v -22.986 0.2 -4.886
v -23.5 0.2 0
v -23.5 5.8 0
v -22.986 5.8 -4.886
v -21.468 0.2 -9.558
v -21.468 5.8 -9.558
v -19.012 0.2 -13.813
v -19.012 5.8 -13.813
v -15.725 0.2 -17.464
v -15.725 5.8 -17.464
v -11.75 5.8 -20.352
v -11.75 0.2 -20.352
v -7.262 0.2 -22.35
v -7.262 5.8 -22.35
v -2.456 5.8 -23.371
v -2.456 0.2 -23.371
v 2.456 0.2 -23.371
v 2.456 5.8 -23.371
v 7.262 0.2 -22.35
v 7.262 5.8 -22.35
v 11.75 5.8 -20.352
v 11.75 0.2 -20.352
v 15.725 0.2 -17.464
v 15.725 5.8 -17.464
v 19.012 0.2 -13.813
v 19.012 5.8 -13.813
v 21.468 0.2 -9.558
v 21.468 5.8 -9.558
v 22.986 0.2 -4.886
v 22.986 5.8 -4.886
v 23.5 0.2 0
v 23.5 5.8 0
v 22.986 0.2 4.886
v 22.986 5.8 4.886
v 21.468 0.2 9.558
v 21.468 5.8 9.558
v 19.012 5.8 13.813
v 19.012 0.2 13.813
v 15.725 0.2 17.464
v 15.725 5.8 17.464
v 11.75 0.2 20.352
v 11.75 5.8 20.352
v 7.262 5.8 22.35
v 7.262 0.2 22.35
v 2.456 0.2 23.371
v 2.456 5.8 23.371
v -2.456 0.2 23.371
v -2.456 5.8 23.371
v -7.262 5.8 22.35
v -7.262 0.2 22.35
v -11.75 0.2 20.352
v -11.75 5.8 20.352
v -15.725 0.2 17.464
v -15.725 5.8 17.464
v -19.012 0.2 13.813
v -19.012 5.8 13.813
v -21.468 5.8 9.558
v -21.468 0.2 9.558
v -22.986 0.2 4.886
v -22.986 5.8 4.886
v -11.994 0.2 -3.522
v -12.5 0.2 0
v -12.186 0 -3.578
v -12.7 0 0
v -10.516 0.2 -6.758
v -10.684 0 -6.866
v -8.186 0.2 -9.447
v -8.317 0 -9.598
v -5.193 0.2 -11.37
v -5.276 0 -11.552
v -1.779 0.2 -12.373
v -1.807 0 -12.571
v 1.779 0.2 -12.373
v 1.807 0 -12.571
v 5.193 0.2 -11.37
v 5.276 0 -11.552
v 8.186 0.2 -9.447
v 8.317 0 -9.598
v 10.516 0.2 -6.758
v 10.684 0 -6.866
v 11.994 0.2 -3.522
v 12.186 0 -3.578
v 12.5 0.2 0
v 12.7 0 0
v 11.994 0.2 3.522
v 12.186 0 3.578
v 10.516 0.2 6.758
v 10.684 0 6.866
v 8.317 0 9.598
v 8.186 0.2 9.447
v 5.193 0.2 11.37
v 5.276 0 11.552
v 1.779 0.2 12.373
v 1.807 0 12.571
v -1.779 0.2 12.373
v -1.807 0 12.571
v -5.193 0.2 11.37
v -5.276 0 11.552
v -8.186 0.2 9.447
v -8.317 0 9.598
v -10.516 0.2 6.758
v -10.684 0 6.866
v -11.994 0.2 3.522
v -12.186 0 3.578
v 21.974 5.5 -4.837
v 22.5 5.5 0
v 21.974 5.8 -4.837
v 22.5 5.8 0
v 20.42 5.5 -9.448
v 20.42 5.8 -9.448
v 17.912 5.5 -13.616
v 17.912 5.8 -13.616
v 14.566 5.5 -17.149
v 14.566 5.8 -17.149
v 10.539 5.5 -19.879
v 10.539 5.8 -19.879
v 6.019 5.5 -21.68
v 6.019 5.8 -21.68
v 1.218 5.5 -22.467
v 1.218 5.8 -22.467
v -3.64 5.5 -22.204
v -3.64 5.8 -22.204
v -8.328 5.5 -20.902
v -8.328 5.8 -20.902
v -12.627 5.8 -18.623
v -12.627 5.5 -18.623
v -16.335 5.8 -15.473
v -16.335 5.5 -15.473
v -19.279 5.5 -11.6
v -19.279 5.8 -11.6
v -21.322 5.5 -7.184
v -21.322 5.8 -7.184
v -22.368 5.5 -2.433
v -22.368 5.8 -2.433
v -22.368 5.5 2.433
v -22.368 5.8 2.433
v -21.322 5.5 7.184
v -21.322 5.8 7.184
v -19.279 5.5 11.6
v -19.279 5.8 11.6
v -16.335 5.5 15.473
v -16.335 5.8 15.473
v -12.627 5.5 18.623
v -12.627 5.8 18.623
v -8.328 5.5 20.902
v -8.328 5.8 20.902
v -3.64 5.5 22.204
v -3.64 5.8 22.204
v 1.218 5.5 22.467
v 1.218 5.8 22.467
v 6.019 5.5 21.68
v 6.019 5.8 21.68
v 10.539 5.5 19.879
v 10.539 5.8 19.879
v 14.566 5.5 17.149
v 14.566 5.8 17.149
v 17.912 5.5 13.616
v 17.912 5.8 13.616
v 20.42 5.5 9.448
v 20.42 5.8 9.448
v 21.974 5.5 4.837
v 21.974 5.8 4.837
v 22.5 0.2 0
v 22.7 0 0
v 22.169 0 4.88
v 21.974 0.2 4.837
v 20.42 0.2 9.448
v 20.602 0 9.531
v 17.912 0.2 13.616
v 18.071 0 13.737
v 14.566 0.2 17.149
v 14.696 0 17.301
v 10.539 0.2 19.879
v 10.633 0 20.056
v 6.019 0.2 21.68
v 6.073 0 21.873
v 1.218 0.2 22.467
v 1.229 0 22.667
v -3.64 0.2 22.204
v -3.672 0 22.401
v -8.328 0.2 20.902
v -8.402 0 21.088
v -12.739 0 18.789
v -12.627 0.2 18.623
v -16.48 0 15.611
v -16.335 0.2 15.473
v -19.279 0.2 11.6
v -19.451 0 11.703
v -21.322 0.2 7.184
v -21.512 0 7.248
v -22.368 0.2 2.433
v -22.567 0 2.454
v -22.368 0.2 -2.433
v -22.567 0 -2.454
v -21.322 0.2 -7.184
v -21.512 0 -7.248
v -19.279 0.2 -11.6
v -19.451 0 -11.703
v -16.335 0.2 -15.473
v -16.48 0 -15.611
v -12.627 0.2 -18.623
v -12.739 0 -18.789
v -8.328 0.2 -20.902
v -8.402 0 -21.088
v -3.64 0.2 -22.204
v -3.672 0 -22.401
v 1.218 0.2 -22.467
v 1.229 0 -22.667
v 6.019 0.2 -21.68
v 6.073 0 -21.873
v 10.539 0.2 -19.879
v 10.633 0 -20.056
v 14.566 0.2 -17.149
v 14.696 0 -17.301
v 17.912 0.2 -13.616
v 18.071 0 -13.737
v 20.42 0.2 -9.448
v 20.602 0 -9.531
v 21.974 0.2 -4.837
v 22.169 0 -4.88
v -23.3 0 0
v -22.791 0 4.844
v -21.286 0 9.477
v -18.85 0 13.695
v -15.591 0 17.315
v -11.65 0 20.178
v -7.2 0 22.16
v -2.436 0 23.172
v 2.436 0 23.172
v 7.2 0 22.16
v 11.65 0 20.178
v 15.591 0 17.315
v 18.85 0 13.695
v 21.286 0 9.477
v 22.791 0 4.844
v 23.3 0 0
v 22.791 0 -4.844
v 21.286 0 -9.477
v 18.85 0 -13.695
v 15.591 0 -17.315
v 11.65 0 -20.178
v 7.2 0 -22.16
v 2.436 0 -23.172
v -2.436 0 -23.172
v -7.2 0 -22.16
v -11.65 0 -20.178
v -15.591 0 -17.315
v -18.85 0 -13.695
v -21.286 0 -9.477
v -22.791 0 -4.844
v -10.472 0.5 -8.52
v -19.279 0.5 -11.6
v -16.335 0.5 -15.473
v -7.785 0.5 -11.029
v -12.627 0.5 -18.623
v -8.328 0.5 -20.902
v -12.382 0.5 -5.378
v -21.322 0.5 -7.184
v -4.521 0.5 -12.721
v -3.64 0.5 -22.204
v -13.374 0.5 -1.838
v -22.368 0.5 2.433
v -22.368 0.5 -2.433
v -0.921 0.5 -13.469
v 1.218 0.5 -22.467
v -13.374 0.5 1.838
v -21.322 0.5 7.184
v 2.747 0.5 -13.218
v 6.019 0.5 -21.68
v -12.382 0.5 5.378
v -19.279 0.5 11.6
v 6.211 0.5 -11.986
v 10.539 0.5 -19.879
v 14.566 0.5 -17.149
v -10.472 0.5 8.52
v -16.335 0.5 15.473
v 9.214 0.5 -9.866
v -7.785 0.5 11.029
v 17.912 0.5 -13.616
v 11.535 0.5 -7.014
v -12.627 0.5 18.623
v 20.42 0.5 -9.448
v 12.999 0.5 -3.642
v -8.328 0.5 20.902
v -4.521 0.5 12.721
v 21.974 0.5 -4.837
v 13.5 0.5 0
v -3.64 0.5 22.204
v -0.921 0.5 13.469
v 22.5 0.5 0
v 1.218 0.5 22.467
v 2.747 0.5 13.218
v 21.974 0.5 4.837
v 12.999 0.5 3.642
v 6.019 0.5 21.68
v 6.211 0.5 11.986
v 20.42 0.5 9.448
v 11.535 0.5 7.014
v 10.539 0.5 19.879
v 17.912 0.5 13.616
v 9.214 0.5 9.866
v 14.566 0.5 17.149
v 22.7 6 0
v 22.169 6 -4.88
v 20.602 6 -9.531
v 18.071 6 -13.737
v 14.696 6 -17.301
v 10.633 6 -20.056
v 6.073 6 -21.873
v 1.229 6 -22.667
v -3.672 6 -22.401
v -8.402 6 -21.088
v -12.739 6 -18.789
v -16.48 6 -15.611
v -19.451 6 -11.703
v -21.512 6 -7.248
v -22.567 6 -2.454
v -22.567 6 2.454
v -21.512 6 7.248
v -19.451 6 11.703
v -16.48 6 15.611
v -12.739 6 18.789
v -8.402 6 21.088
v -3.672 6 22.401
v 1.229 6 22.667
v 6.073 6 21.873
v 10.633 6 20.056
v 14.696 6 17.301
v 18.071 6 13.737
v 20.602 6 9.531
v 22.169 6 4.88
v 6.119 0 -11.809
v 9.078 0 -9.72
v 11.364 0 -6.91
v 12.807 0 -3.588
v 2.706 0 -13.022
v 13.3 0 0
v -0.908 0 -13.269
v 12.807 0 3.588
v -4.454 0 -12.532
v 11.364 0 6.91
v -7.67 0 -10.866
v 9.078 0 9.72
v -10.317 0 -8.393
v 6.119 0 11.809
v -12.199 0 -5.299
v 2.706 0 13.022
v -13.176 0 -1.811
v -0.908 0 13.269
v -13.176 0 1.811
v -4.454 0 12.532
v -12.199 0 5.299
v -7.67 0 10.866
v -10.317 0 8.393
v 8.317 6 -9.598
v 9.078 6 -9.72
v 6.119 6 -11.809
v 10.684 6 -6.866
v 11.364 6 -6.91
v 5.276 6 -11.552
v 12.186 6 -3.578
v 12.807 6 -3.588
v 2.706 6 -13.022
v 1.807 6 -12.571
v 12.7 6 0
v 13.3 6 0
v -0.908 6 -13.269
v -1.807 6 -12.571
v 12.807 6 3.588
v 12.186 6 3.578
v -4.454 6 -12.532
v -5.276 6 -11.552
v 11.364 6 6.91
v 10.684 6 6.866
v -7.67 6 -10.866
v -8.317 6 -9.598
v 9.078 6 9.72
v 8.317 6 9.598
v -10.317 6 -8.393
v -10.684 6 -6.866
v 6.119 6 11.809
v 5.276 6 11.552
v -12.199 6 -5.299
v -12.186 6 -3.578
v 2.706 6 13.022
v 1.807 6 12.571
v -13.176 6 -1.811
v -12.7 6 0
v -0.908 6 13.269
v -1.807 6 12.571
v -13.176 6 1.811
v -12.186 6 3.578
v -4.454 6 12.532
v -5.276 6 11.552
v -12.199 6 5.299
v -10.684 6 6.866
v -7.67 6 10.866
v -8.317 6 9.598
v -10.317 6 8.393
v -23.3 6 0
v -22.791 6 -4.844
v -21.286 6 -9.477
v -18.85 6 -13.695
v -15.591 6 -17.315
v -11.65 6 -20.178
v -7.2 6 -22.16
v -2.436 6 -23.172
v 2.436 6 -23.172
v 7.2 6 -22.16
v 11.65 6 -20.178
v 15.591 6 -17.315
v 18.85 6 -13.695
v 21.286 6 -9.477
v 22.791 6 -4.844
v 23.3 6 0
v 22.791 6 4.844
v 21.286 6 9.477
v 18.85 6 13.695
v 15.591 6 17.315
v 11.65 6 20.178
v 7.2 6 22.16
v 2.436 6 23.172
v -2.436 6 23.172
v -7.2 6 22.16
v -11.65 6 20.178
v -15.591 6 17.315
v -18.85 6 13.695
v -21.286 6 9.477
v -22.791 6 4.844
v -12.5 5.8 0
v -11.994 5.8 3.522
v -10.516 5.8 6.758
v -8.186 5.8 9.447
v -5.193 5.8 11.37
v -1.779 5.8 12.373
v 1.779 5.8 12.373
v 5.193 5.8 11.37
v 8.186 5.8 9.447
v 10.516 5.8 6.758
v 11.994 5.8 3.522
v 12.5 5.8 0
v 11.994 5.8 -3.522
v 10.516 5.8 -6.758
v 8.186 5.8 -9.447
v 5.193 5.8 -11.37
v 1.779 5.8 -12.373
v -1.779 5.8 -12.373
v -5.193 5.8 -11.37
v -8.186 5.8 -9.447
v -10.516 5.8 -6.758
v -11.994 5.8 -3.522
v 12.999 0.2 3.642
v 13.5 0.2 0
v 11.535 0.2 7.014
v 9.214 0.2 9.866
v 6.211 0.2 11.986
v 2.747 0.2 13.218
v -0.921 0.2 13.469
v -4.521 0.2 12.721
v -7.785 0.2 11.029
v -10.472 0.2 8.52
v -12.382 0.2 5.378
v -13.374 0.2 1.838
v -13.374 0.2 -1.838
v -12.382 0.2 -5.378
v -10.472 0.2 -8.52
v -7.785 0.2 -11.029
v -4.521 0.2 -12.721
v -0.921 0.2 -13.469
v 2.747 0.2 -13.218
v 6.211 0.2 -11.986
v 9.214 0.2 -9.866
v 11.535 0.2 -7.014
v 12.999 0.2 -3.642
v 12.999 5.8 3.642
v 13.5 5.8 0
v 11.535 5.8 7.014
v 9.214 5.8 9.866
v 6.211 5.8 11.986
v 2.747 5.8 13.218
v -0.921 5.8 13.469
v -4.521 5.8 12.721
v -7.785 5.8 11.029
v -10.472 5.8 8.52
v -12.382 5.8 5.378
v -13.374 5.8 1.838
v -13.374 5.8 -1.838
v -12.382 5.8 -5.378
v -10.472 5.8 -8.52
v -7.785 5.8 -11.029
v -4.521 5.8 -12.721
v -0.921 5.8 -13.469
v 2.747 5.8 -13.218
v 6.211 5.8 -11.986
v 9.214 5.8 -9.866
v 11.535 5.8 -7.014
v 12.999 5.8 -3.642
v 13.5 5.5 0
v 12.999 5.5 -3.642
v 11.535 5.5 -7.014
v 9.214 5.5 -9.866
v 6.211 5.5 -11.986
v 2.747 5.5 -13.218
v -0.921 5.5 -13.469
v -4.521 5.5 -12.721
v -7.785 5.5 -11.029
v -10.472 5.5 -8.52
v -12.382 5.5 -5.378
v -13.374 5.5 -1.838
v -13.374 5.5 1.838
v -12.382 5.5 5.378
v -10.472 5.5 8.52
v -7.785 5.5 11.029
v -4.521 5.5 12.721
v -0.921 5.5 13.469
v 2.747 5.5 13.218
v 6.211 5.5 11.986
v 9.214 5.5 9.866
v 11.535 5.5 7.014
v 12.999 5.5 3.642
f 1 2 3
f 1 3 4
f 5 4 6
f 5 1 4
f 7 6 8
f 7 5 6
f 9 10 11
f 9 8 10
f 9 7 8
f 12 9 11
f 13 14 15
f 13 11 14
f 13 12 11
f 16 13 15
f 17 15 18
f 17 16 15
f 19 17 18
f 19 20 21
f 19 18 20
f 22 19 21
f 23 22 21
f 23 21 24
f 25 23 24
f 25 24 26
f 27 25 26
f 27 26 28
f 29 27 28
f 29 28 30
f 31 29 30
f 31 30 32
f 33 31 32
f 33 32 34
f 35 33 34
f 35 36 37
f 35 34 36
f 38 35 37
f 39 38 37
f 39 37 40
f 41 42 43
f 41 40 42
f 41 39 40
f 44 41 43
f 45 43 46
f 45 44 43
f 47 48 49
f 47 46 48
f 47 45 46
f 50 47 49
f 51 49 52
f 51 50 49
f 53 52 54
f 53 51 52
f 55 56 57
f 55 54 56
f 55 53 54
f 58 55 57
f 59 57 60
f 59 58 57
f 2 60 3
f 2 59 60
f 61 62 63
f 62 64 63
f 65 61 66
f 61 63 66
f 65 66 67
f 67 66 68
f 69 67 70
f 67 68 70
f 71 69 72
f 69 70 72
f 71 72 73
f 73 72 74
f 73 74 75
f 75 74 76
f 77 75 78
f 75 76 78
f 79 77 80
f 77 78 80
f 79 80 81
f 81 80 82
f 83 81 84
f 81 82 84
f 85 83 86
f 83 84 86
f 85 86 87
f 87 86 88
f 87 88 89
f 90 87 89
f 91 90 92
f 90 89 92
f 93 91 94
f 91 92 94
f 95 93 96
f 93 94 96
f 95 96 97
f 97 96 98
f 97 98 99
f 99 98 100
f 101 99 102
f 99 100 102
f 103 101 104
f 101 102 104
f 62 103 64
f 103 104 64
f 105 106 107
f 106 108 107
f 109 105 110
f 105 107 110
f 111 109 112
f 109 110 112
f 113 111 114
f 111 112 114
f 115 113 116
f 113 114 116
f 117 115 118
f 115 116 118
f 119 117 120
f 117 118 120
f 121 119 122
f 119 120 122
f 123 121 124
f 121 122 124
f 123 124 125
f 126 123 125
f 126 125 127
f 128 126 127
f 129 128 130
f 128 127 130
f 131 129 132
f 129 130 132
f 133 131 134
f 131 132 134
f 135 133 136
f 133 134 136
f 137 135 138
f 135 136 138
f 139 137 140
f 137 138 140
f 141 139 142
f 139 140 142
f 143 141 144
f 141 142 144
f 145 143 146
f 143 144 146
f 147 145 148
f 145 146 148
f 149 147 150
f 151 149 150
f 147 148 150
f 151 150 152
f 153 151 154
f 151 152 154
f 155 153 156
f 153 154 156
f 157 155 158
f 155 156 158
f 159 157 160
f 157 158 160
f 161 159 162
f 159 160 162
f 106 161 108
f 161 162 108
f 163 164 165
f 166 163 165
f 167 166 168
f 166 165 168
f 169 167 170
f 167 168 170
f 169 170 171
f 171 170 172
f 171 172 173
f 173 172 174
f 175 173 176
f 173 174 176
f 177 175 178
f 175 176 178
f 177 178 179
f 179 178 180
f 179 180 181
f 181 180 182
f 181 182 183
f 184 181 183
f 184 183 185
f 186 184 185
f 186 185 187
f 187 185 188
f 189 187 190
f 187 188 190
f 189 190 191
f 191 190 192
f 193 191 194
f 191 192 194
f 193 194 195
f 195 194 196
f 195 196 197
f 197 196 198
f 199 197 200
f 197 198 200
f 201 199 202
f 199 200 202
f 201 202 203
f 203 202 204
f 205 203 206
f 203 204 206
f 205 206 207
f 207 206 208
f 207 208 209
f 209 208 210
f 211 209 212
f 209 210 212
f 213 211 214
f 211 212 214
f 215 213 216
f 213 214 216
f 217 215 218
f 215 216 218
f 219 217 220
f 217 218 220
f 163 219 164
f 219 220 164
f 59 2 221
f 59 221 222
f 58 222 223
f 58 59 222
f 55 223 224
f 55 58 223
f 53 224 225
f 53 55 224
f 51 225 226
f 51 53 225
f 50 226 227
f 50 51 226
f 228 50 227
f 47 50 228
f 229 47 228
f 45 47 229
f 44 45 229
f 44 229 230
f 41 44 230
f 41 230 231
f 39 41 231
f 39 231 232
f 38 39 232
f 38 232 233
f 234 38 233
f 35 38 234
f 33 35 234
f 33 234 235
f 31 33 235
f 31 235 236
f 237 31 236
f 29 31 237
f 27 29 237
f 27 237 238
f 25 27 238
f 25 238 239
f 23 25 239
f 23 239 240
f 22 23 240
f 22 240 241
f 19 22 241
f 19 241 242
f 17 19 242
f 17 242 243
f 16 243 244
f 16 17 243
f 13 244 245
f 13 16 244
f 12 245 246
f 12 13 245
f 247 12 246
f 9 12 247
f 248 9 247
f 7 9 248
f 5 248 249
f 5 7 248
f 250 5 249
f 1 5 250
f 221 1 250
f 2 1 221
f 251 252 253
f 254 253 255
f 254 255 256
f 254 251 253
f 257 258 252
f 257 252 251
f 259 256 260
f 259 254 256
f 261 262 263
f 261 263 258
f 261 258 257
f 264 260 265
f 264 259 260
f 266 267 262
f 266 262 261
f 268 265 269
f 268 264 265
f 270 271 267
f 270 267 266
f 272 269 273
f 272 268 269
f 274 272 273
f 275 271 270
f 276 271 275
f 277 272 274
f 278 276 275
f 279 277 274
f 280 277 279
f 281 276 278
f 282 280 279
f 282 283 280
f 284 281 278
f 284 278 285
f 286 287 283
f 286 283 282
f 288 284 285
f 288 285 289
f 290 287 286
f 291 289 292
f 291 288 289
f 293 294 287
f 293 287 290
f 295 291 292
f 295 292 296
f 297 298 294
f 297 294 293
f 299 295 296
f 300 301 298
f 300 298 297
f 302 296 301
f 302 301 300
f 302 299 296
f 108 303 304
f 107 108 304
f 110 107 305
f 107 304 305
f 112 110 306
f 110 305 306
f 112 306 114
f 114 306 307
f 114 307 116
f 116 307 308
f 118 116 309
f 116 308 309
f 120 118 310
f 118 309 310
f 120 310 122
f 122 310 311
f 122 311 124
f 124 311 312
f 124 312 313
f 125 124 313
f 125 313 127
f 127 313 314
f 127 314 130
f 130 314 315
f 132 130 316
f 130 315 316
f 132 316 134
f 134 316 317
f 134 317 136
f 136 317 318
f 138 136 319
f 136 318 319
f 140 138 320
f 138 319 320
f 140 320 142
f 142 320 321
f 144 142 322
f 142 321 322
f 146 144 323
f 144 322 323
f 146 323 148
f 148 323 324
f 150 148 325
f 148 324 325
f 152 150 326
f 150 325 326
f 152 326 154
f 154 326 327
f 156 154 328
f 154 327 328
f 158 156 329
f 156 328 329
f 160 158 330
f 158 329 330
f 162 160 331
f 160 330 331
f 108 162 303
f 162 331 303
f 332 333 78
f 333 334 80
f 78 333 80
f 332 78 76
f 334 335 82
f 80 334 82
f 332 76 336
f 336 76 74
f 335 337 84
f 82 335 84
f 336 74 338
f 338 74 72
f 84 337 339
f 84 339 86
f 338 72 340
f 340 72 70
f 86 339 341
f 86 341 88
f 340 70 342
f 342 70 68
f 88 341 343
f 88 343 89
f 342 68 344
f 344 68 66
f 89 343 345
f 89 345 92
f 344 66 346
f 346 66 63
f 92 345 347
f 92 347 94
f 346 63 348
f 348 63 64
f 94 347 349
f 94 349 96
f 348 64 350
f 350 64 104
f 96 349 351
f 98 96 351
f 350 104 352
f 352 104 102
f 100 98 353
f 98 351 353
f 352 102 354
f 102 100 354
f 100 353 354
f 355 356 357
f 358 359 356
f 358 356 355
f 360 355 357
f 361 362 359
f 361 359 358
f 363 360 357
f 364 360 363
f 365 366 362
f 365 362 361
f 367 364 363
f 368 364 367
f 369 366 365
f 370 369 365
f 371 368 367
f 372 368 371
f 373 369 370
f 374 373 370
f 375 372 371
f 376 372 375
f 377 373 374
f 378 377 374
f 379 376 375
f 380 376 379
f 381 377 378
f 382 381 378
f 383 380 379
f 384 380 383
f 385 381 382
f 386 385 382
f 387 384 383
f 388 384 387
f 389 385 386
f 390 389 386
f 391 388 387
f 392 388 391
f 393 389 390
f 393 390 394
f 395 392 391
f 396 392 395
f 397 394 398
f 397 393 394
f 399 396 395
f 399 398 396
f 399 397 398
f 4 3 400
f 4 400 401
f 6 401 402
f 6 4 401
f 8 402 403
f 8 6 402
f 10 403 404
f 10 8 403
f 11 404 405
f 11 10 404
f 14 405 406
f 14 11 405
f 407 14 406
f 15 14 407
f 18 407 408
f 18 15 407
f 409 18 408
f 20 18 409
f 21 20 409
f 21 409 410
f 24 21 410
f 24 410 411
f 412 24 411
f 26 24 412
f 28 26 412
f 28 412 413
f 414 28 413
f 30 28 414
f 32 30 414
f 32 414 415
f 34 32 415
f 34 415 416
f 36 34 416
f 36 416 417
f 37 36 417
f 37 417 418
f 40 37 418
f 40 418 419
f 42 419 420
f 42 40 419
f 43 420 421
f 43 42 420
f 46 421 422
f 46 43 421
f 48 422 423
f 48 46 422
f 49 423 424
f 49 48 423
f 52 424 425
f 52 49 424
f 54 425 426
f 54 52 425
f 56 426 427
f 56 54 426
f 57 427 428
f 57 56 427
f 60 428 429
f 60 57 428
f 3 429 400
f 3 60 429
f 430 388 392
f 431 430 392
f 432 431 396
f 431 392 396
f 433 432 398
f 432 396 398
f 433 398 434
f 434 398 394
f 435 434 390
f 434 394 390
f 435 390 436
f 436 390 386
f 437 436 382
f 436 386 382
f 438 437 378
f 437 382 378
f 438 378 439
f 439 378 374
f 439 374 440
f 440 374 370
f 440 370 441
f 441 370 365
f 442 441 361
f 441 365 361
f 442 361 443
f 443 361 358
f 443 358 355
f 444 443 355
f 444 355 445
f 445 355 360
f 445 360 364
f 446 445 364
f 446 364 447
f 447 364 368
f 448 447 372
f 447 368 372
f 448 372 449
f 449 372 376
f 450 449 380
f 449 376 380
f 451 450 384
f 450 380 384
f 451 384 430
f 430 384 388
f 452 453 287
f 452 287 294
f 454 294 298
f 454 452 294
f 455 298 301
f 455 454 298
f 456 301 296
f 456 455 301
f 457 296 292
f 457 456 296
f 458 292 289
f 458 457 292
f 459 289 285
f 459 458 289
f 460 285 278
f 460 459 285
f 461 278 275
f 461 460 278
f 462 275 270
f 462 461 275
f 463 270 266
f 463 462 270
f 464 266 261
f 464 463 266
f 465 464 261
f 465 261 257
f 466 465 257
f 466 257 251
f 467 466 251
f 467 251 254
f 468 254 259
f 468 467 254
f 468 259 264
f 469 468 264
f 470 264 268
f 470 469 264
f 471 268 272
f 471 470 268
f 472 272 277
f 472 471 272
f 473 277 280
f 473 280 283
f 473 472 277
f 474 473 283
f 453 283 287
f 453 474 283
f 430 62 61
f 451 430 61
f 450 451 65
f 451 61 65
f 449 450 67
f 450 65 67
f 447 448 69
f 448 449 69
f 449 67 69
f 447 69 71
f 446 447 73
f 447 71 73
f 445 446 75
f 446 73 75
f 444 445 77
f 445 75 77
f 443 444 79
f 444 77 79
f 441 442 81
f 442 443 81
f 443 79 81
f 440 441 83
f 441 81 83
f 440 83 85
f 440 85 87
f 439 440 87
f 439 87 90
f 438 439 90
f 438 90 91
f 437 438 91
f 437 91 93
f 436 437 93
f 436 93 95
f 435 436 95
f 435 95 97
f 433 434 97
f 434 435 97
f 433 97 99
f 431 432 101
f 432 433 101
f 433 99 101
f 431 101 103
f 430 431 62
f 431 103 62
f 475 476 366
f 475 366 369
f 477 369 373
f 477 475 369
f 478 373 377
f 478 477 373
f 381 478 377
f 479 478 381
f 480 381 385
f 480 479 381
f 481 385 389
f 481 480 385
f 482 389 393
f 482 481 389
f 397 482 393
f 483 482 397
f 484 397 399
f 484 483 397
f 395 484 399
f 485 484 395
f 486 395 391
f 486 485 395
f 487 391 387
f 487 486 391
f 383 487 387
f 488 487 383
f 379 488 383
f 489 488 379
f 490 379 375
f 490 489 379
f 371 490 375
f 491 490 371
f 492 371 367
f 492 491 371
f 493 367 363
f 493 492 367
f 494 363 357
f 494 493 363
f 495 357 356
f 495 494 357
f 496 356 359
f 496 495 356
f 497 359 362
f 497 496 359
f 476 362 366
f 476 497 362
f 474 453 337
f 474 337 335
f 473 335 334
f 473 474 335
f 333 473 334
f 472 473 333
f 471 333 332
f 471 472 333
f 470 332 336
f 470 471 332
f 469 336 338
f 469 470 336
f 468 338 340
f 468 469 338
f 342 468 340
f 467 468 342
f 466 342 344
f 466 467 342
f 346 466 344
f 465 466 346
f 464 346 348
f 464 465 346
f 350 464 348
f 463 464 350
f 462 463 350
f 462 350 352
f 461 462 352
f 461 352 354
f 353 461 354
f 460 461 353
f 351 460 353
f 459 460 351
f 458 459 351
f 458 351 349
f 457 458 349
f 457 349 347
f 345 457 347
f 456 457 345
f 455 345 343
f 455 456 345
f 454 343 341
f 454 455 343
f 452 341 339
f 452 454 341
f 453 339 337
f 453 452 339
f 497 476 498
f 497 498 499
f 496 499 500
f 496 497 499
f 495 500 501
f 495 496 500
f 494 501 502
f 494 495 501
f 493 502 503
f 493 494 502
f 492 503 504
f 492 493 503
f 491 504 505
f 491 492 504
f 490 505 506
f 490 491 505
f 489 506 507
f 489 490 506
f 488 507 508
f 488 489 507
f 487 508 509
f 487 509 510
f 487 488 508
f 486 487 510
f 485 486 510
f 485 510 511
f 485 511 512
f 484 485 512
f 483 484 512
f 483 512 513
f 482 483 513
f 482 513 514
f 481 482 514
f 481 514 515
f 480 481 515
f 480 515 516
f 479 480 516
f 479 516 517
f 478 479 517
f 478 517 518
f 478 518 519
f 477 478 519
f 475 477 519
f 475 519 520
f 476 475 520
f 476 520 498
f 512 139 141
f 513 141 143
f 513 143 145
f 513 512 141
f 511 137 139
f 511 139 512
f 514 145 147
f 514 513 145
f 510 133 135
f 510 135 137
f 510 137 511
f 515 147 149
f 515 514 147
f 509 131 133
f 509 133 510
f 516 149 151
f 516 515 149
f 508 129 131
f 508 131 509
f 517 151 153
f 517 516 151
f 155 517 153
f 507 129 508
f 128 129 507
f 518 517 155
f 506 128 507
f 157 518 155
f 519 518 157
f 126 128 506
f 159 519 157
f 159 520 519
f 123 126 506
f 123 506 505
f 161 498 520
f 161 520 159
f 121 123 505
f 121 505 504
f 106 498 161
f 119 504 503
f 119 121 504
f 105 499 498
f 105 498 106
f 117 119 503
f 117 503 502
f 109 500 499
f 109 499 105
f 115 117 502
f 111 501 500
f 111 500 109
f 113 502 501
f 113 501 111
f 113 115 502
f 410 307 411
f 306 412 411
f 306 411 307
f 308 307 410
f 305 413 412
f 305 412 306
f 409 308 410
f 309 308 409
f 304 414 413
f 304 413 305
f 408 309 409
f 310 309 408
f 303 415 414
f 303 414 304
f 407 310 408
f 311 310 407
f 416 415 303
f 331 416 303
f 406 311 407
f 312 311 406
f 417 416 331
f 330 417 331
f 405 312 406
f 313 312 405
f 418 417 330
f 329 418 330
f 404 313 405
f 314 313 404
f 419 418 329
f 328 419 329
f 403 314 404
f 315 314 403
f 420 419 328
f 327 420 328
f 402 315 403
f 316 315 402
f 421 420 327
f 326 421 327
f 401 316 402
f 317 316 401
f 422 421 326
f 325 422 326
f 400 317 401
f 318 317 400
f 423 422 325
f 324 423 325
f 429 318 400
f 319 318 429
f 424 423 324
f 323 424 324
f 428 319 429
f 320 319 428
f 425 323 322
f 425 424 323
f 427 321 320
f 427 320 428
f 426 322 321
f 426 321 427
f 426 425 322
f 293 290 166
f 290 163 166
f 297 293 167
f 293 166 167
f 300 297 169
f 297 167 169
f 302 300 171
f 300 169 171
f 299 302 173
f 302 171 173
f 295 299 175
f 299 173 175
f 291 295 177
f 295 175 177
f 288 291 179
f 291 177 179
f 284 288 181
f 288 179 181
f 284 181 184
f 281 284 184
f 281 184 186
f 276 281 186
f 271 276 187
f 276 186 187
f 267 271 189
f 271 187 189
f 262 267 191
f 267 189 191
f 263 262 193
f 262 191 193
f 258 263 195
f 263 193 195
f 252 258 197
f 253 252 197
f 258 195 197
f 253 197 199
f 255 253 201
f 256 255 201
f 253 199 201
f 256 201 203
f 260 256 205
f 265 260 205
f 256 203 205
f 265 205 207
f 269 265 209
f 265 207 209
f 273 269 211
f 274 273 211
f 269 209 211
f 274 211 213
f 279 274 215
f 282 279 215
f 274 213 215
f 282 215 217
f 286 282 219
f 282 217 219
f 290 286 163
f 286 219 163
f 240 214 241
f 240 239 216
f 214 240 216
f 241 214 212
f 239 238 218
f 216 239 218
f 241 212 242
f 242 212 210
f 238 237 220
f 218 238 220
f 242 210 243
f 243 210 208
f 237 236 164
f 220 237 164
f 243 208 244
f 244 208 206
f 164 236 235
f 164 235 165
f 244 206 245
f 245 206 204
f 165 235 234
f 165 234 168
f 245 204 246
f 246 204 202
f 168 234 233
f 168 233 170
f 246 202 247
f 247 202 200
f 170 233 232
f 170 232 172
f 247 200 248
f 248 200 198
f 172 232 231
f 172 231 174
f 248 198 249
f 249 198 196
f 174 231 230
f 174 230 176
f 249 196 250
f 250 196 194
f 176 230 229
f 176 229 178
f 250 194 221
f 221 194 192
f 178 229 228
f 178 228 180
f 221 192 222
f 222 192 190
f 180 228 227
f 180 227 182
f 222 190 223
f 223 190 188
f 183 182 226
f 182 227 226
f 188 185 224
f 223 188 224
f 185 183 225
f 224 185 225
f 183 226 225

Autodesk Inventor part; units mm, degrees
ref_plane "YZ Plane" through (0, 0, 0) normal (1, 0, 0) x (0, 1, 0)
ref_plane "XZ Plane" through (0, 0, 0) normal (0, 1, 0) x (-1, 0, 0)
ref_plane "XY Plane" through (0, 0, 0) normal (0, 0, 1) x (1, 0, 0)
sketch "Эскиз1" plane through (0, 0, 0) normal (0, 1, 0) x (-1, 0, 0)
  circle A0 centre (0, 0) radius 23.5
  circle A1 centre (0, 0) radius 12.5
  dimension "d0" = 47
  dimension "d1" = 25
extrude "Выдавливание1" add sketch "Эскиз1" along normal blind 6
sketch "Эскиз2" plane through (0, 6, 0) normal (0, 1, 0) x (1, 0, 0)
  circle A0 centre (0, 0) radius 13.5
  circle A1 centre (0, 0) radius 22.5
  circle A2 centre (0, 0) radius 23.5 projected
  circle A3 centre (0, 0) radius 12.5 projected
  dimension "d4" = 1
  dimension "d5" = 1
extrude "Выдавливание2" cut sketch "Эскиз2" against normal blind 0.5 contours A1
sketch "Эскиз3" plane through (0, 0, 0) normal (0, -1, 0) x (1, 0, 0)
  circle A0 centre (0, 0) radius 13.5 projected
  circle A1 centre (0, 0) radius 22.5 projected
extrude "Выдавливание3" cut sketch "Эскиз3" against normal blind 0.5
chamfer "Фаска1" distance 0.2 angle 45 8 edges at (-13.5, 0, 0) (12.5, 0, 0) (-22.5, 0, 0) (23.5, 0, 0) (23.5, 6, 0) (-22.5, 6, 0) (-13.5, 6, 0) (12.5, 6, 0)
properties part number "Подшипник 626Z" material "Титан"
